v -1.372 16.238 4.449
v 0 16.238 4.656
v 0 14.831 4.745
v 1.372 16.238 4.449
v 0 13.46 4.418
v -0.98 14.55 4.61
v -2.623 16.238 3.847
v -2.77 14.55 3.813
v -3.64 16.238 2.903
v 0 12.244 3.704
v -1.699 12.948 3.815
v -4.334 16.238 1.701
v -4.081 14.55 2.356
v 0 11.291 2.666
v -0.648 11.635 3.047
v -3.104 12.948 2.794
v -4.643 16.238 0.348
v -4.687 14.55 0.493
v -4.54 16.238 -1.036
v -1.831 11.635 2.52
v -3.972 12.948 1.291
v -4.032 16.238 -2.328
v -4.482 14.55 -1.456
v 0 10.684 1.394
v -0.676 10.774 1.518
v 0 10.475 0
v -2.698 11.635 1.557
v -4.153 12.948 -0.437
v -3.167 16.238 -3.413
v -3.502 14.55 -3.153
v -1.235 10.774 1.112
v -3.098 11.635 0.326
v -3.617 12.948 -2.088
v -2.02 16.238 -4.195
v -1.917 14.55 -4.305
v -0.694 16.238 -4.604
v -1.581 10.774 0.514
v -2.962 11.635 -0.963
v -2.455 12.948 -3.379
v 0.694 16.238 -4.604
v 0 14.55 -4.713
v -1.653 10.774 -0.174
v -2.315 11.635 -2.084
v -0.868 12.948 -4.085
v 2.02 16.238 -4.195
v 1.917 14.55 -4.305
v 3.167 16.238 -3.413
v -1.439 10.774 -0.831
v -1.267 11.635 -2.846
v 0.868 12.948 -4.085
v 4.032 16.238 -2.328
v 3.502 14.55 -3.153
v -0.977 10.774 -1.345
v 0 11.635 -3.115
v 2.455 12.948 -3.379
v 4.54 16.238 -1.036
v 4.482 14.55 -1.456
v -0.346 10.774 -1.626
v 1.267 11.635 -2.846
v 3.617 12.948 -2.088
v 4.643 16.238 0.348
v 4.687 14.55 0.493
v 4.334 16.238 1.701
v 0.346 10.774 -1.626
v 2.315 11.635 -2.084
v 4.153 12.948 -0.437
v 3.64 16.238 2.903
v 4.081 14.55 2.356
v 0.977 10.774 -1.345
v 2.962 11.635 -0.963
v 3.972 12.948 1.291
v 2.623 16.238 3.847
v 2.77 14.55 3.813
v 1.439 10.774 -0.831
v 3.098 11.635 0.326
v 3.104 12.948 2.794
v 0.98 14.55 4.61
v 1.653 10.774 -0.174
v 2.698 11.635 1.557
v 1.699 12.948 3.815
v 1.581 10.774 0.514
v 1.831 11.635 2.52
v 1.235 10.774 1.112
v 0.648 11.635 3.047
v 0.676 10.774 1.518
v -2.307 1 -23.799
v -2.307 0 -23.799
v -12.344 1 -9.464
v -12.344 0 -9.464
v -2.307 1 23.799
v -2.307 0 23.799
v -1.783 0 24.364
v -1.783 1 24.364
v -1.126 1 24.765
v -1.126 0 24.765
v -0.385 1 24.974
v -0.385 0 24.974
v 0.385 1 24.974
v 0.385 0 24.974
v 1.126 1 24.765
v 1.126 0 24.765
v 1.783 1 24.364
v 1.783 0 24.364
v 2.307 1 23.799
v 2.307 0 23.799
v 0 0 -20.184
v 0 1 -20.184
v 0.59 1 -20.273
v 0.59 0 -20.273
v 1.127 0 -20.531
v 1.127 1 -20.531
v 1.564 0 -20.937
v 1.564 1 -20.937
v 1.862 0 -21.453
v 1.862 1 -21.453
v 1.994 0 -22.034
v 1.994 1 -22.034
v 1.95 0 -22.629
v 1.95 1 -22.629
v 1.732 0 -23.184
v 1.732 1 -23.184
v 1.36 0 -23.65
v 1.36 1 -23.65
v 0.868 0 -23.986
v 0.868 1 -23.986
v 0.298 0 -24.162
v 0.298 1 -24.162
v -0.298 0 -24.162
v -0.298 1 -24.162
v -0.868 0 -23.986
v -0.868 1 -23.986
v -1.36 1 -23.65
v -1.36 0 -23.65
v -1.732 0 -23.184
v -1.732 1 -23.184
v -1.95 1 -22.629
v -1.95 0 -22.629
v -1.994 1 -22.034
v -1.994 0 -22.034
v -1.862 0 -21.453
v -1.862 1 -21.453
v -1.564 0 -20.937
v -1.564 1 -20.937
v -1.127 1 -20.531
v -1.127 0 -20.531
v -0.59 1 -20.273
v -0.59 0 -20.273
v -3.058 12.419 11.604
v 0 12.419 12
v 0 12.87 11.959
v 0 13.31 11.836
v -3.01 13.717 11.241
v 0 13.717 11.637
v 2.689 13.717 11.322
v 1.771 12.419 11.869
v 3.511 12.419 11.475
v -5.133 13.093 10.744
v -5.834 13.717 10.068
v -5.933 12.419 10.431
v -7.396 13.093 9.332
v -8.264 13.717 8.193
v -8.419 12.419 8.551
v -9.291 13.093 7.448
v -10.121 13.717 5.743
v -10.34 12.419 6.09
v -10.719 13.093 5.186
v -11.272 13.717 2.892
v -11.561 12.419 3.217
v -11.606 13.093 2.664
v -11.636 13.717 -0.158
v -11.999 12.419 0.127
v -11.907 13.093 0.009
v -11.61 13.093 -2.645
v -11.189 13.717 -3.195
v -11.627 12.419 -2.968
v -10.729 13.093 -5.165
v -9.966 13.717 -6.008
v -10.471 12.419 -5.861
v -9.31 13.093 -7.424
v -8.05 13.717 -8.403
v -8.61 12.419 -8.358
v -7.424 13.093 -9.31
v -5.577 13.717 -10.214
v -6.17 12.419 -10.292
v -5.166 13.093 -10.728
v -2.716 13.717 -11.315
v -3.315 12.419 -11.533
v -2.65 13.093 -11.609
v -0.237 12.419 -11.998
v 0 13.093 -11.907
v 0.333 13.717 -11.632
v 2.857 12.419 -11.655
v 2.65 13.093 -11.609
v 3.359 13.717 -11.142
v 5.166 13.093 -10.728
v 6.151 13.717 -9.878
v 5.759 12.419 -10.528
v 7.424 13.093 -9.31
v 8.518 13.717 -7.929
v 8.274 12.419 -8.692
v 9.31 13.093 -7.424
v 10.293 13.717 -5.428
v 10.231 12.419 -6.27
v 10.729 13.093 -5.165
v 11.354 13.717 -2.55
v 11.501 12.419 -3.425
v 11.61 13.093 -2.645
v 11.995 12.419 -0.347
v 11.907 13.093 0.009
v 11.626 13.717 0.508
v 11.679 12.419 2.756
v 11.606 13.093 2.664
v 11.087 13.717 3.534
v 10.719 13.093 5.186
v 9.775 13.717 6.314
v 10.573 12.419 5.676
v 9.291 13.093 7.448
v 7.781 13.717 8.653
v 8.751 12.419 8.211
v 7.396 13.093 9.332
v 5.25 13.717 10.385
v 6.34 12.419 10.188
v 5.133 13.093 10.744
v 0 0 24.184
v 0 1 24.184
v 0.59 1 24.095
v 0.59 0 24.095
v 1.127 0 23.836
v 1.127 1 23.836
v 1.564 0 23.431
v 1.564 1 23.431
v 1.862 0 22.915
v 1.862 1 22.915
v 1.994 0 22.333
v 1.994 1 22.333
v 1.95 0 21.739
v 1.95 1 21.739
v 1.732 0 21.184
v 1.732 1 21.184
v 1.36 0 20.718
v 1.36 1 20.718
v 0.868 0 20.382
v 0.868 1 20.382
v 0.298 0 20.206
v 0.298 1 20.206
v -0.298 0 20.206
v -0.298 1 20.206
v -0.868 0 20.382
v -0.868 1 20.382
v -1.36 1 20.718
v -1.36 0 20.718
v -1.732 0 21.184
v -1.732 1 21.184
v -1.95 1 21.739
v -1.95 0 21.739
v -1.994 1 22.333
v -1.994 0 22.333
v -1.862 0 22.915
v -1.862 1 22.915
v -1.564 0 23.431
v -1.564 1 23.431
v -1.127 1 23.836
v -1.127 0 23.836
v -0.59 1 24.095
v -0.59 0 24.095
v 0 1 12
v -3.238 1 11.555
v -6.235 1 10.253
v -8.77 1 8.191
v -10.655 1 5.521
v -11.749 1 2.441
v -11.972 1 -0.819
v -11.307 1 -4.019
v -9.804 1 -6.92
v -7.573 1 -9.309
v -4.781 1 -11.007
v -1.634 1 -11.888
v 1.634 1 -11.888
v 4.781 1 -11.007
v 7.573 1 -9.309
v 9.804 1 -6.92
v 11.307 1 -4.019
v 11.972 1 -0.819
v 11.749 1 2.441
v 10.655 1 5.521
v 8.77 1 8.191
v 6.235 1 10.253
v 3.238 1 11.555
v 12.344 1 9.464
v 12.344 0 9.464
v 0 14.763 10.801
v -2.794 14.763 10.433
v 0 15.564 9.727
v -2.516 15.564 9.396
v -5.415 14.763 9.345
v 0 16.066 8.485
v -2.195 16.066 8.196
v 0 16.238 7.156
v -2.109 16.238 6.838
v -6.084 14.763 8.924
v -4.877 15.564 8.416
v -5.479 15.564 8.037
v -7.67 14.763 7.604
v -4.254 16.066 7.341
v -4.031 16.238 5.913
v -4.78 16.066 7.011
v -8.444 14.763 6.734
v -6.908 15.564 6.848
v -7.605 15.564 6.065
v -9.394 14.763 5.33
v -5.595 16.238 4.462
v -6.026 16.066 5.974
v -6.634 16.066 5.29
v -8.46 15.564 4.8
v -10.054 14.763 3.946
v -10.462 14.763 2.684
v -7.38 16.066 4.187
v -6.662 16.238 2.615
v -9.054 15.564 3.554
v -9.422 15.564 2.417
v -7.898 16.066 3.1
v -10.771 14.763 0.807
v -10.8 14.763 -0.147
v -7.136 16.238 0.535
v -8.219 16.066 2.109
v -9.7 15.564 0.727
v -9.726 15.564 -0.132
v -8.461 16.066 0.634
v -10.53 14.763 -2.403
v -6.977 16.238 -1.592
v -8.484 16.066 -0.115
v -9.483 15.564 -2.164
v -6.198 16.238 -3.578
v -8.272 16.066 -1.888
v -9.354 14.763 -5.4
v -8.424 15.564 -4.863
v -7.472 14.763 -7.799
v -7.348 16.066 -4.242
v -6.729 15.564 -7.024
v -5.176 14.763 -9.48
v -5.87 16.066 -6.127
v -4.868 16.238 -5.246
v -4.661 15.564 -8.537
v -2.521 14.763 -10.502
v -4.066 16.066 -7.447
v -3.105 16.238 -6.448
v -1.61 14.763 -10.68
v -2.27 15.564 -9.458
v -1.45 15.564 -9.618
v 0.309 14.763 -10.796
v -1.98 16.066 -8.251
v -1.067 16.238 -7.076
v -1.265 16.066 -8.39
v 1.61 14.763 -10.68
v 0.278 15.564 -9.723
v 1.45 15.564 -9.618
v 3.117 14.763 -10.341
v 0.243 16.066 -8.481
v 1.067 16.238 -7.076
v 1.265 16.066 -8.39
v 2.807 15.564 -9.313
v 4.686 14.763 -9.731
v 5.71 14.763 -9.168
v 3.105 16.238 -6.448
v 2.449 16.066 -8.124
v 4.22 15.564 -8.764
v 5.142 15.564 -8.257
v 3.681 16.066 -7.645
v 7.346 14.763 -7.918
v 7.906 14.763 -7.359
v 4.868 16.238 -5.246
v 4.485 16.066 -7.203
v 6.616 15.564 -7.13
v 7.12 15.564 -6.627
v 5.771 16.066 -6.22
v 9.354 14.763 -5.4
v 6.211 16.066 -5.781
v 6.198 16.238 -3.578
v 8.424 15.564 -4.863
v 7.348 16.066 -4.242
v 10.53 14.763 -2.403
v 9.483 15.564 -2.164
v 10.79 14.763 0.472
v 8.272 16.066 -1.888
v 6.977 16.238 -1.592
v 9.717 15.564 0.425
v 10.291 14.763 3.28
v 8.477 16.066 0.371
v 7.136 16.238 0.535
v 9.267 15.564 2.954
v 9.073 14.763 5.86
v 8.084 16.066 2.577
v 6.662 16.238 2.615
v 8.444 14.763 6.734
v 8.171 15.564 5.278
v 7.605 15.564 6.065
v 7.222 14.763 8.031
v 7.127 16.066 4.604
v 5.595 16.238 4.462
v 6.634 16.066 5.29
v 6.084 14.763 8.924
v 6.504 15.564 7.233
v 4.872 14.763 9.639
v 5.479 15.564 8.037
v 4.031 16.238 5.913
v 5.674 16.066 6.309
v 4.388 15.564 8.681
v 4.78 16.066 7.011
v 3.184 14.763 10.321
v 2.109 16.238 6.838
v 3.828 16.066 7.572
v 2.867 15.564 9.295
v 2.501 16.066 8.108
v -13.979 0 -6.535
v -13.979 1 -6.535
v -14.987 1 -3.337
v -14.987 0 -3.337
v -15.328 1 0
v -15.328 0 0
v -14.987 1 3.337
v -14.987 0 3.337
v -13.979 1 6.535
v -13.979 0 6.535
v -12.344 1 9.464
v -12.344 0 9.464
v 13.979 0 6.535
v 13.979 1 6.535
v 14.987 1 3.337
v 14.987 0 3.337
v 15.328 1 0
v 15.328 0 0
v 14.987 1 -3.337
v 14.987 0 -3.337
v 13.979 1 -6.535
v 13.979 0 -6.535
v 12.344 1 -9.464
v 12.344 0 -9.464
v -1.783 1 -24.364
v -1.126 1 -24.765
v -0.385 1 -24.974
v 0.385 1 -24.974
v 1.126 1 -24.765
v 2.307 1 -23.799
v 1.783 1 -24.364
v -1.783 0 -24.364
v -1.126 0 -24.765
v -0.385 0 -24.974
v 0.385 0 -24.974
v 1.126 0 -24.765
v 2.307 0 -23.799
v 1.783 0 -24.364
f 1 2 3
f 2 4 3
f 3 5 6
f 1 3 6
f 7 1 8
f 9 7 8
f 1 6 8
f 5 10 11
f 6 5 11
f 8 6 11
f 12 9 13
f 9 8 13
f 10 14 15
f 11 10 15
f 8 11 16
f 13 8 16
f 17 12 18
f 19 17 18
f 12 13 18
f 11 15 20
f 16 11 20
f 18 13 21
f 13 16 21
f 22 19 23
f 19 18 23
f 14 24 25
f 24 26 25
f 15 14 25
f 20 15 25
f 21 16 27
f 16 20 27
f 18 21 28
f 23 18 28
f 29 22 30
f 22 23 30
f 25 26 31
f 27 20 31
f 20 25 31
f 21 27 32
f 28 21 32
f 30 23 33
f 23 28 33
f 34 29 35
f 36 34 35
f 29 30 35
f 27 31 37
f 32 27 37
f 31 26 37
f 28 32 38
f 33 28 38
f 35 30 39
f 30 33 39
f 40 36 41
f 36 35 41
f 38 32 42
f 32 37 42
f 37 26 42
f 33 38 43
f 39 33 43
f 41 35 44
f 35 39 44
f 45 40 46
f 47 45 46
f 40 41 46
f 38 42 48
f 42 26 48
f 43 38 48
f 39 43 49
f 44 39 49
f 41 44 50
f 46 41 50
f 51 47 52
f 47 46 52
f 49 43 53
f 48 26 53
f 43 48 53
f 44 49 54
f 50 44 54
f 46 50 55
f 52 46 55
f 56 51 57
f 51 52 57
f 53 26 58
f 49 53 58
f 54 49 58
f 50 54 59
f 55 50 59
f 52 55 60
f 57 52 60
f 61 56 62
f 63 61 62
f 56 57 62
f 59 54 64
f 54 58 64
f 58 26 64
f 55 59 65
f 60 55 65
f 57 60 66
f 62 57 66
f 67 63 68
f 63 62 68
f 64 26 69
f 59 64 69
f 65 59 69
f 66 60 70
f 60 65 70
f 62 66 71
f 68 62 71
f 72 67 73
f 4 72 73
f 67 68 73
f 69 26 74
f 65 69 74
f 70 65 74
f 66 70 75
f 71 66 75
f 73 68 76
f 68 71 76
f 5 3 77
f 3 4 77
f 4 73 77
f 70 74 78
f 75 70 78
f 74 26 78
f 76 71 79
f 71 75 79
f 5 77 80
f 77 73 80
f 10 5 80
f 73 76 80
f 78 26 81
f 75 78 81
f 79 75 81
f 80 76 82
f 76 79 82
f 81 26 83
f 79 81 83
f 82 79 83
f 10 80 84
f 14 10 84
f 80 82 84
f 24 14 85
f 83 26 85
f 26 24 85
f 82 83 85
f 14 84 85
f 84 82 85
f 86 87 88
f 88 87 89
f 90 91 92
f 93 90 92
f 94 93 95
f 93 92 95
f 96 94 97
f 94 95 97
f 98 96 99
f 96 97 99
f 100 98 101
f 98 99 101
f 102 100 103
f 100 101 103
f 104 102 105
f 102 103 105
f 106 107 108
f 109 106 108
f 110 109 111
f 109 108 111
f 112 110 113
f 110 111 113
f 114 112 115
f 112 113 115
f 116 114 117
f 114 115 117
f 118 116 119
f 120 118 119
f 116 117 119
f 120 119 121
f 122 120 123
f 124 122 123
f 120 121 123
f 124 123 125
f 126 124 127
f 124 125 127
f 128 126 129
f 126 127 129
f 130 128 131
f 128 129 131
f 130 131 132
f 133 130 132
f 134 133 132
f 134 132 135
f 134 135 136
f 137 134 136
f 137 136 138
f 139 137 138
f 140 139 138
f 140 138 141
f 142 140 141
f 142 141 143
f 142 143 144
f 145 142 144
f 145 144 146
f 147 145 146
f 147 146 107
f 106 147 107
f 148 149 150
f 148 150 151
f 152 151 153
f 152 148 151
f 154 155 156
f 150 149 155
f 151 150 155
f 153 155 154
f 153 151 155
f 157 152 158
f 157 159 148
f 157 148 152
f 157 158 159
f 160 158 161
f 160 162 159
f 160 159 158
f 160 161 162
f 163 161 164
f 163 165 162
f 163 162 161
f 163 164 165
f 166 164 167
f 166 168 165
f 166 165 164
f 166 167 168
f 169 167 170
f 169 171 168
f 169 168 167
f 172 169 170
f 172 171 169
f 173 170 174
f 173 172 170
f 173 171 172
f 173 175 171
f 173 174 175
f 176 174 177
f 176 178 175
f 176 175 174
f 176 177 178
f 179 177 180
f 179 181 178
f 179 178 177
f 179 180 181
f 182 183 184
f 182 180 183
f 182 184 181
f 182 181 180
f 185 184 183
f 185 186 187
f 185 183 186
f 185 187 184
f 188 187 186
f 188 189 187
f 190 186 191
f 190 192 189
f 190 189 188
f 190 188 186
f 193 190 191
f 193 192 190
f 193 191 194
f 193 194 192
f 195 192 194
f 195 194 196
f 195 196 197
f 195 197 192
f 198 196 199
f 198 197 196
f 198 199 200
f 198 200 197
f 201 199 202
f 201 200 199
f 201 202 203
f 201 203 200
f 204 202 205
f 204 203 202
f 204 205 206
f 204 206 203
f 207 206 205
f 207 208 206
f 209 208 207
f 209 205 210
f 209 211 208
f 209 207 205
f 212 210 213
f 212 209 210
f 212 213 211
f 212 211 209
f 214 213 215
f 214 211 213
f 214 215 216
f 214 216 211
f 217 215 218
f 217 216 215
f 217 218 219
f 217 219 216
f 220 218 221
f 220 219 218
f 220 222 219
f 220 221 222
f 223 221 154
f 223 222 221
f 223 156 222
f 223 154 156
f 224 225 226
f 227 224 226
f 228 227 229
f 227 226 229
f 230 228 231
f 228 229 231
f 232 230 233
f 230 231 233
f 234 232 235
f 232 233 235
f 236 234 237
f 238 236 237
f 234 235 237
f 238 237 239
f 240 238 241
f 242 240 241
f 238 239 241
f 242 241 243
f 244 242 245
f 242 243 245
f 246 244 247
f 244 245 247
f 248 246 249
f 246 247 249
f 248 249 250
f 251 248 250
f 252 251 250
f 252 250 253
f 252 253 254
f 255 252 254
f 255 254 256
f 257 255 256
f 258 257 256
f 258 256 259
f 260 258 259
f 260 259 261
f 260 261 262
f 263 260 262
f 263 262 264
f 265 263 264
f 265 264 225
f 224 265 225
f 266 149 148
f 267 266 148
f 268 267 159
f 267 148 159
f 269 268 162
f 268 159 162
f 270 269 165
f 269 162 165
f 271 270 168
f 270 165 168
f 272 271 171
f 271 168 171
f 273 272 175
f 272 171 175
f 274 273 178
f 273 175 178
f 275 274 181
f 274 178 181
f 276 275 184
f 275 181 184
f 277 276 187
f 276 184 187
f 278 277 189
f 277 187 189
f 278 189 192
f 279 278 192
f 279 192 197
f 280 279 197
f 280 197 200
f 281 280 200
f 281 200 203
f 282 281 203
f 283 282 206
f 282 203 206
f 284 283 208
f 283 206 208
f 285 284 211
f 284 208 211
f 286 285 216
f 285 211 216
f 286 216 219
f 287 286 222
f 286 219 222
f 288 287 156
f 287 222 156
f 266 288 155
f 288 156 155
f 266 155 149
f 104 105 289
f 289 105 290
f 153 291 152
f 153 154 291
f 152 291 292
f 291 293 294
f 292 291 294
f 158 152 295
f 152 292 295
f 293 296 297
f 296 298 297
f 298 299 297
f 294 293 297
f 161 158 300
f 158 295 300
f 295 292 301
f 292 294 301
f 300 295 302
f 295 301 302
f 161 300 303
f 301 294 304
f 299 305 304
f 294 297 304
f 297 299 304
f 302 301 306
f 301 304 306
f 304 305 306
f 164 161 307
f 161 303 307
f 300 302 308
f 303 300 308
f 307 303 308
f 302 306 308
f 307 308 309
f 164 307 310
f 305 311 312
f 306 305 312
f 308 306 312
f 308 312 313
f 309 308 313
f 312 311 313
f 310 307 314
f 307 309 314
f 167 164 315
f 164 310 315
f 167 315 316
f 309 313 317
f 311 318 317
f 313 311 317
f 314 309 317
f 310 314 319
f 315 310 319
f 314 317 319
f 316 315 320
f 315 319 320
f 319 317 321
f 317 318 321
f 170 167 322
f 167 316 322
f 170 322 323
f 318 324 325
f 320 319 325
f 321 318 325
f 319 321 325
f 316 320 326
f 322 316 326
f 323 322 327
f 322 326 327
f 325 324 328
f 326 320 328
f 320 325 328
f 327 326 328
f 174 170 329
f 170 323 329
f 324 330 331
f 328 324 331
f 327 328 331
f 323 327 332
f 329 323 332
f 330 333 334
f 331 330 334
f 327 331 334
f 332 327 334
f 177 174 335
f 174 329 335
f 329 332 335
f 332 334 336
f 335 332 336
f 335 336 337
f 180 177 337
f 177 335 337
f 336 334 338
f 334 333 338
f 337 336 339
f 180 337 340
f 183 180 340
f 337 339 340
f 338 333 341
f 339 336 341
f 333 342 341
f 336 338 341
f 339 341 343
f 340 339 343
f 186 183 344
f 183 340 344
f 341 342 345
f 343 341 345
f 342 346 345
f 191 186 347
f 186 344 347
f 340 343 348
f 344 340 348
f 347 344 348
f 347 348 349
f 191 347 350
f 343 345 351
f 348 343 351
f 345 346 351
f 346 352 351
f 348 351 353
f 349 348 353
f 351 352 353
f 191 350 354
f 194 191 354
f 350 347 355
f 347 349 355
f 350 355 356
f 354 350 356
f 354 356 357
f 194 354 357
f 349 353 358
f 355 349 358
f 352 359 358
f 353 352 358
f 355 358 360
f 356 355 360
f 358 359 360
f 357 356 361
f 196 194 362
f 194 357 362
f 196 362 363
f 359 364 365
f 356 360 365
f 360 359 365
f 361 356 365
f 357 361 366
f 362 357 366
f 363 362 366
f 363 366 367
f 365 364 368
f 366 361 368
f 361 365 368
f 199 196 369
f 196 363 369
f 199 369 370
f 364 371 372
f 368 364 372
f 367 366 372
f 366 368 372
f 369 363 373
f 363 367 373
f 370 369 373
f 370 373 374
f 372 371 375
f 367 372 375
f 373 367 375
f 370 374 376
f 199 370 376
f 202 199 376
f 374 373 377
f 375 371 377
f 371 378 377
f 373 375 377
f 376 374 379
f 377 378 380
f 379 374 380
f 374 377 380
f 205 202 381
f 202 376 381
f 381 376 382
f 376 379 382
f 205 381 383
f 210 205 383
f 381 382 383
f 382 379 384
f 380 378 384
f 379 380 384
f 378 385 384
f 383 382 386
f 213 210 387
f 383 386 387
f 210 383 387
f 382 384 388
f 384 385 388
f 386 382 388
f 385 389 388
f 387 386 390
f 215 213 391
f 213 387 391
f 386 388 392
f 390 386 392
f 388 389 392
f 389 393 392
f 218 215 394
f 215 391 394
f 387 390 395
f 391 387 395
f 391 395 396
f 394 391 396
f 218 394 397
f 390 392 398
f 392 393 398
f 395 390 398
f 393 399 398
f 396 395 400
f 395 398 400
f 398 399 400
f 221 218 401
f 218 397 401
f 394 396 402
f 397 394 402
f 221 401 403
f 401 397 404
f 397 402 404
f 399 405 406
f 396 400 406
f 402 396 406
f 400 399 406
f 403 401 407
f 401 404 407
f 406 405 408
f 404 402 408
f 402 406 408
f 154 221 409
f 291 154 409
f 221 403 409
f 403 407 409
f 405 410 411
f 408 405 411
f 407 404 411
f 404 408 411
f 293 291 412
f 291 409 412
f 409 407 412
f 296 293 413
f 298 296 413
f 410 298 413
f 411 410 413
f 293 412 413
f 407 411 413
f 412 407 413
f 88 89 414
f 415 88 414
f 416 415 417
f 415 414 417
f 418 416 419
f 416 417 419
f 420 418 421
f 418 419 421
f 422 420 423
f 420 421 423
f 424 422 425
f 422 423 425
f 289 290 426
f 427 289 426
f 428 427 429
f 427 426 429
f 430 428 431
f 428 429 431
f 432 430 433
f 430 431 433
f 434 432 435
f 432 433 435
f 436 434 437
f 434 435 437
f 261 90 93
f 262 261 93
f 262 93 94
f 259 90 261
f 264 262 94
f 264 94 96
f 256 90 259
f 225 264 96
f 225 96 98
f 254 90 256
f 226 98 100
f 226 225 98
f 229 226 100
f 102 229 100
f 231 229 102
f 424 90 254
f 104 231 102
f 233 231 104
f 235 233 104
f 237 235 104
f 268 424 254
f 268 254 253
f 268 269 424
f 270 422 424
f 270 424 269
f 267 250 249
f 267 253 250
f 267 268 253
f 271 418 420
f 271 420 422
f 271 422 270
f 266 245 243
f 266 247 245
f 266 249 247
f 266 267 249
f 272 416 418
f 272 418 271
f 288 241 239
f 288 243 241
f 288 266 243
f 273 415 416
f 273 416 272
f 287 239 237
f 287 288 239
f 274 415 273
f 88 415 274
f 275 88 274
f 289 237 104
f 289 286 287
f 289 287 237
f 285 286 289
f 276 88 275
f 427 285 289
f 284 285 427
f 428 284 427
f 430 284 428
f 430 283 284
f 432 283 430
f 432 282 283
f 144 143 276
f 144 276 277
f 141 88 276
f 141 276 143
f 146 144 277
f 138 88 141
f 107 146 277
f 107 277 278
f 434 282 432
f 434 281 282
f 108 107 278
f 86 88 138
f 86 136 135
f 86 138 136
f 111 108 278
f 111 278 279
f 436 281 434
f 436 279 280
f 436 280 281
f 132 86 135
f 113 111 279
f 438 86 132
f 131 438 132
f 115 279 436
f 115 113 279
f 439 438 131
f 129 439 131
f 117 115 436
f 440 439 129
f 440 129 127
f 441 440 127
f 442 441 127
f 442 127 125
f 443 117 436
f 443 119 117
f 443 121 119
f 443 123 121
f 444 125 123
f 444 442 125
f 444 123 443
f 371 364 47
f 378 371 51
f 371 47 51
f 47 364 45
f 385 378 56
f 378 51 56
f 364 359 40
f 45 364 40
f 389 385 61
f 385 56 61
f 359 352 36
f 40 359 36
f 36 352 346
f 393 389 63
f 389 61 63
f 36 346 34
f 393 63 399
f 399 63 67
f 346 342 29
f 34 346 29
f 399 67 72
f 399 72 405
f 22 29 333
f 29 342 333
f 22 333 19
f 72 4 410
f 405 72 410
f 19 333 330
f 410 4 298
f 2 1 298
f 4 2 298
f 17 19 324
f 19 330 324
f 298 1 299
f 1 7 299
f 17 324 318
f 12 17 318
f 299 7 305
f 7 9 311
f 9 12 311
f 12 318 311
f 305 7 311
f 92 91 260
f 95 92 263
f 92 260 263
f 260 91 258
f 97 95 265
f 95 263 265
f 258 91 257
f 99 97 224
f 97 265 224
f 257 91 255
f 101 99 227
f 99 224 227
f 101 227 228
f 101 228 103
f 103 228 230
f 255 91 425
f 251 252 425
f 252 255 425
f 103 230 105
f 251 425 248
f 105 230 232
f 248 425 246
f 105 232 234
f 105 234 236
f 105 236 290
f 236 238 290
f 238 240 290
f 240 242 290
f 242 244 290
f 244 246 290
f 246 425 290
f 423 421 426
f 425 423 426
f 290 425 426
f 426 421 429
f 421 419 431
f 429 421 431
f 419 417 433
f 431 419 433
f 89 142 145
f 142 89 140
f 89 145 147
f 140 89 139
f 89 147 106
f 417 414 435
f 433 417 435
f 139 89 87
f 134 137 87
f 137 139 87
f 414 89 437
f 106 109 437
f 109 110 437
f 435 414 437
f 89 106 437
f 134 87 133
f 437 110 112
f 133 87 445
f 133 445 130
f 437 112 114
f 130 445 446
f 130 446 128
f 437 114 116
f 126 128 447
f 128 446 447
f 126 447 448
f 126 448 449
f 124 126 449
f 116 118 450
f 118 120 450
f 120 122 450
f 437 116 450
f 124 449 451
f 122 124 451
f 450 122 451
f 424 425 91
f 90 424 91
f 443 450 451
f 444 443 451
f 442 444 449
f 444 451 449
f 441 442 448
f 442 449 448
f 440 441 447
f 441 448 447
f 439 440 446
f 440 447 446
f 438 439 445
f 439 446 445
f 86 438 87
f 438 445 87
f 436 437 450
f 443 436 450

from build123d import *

# Parameters (mm, degrees)
BOSS_EXTRUDE1_DEPTH = 1
FILLET2_R           = 2.5
SKETCH4_R           = 2
CUT_EXTRUDE1_DEPTH  = 34.047536431


with BuildPart() as part:
    # Sketch1 → Boss-Extrude1 (new body)
    with BuildSketch(Plane(origin=(0, 0, 0), x_dir=(1, 0, 0), z_dir=(0, 1, 0))):
        with BuildLine():
            Line((-2.306769174, 23.799171975), (-12.34435681, 9.4640112))
            ThreePointArc((-12.34435681, 9.4640112), (-15.328348079, 0), (-12.34435681, -9.4640112))
            Line((-12.34435681, -9.4640112), (-2.306769174, -23.799171975))
            ThreePointArc((-2.306769174, -23.799171975), (0, -25), (2.306769174, -23.799171975))
            Line((2.306769174, -23.799171975), (12.34435681, -9.4640112))
            ThreePointArc((12.34435681, -9.4640112), (15.328348079, 0), (12.34435681, 9.4640112))
            Line((12.34435681, 9.4640112), (2.306769174, 23.799171975))
            ThreePointArc((2.306769174, 23.799171975), (0, 25), (-2.306769174, 23.799171975))
        make_face()
    extrude(amount=BOSS_EXTRUDE1_DEPTH)

    # Sketch3 → Revolve1 (revolve)
    with BuildSketch(Plane.XY, mode=Mode.PRIVATE) as revolve1_sk:
        with BuildLine():
            Line((0, 1), (12, 1))
            Line((12, 1), (12, 13))
            ThreePointArc((12, 13), (10.06934138, 15.353606271), (7.156329697, 16.2375))
            Line((7.156329697, 16.2375), (4.656329697, 16.2375))
            ThreePointArc((4.656329697, 16.2375), (3.704315473, 12.244265441), (0, 10.475))
            Line((0, 10.475), (0, 1))
        make_face()
    revolve(revolve1_sk.sketch.rotate(Axis((0, 10.475, 0), (0, -1, 0)), 90), axis=Axis((0, 10.475, 0), (0, -1, 0)))

    # Fillet2
    fillet2_edges = [part.edges().sort_by_distance(p)[0] for p in [
        (0, 13, -12),
    ]]
    fillet(fillet2_edges, radius=FILLET2_R)

    # Sketch4 → Cut-Extrude1 (cut, through all)
    with BuildSketch(Plane(origin=(0, 1, 0), x_dir=(1, 0, 0), z_dir=(0, 1, 0))):
        with Locations(Location((0, -22.18395481, 0), (0, 0, 270))):
            Circle(SKETCH4_R)
        with Locations(Location((0, 22.18395481, 0), (0, 0, 270))):
            Circle(SKETCH4_R)
    extrude(amount=-CUT_EXTRUDE1_DEPTH, mode=Mode.SUBTRACT)


solid = part.part
